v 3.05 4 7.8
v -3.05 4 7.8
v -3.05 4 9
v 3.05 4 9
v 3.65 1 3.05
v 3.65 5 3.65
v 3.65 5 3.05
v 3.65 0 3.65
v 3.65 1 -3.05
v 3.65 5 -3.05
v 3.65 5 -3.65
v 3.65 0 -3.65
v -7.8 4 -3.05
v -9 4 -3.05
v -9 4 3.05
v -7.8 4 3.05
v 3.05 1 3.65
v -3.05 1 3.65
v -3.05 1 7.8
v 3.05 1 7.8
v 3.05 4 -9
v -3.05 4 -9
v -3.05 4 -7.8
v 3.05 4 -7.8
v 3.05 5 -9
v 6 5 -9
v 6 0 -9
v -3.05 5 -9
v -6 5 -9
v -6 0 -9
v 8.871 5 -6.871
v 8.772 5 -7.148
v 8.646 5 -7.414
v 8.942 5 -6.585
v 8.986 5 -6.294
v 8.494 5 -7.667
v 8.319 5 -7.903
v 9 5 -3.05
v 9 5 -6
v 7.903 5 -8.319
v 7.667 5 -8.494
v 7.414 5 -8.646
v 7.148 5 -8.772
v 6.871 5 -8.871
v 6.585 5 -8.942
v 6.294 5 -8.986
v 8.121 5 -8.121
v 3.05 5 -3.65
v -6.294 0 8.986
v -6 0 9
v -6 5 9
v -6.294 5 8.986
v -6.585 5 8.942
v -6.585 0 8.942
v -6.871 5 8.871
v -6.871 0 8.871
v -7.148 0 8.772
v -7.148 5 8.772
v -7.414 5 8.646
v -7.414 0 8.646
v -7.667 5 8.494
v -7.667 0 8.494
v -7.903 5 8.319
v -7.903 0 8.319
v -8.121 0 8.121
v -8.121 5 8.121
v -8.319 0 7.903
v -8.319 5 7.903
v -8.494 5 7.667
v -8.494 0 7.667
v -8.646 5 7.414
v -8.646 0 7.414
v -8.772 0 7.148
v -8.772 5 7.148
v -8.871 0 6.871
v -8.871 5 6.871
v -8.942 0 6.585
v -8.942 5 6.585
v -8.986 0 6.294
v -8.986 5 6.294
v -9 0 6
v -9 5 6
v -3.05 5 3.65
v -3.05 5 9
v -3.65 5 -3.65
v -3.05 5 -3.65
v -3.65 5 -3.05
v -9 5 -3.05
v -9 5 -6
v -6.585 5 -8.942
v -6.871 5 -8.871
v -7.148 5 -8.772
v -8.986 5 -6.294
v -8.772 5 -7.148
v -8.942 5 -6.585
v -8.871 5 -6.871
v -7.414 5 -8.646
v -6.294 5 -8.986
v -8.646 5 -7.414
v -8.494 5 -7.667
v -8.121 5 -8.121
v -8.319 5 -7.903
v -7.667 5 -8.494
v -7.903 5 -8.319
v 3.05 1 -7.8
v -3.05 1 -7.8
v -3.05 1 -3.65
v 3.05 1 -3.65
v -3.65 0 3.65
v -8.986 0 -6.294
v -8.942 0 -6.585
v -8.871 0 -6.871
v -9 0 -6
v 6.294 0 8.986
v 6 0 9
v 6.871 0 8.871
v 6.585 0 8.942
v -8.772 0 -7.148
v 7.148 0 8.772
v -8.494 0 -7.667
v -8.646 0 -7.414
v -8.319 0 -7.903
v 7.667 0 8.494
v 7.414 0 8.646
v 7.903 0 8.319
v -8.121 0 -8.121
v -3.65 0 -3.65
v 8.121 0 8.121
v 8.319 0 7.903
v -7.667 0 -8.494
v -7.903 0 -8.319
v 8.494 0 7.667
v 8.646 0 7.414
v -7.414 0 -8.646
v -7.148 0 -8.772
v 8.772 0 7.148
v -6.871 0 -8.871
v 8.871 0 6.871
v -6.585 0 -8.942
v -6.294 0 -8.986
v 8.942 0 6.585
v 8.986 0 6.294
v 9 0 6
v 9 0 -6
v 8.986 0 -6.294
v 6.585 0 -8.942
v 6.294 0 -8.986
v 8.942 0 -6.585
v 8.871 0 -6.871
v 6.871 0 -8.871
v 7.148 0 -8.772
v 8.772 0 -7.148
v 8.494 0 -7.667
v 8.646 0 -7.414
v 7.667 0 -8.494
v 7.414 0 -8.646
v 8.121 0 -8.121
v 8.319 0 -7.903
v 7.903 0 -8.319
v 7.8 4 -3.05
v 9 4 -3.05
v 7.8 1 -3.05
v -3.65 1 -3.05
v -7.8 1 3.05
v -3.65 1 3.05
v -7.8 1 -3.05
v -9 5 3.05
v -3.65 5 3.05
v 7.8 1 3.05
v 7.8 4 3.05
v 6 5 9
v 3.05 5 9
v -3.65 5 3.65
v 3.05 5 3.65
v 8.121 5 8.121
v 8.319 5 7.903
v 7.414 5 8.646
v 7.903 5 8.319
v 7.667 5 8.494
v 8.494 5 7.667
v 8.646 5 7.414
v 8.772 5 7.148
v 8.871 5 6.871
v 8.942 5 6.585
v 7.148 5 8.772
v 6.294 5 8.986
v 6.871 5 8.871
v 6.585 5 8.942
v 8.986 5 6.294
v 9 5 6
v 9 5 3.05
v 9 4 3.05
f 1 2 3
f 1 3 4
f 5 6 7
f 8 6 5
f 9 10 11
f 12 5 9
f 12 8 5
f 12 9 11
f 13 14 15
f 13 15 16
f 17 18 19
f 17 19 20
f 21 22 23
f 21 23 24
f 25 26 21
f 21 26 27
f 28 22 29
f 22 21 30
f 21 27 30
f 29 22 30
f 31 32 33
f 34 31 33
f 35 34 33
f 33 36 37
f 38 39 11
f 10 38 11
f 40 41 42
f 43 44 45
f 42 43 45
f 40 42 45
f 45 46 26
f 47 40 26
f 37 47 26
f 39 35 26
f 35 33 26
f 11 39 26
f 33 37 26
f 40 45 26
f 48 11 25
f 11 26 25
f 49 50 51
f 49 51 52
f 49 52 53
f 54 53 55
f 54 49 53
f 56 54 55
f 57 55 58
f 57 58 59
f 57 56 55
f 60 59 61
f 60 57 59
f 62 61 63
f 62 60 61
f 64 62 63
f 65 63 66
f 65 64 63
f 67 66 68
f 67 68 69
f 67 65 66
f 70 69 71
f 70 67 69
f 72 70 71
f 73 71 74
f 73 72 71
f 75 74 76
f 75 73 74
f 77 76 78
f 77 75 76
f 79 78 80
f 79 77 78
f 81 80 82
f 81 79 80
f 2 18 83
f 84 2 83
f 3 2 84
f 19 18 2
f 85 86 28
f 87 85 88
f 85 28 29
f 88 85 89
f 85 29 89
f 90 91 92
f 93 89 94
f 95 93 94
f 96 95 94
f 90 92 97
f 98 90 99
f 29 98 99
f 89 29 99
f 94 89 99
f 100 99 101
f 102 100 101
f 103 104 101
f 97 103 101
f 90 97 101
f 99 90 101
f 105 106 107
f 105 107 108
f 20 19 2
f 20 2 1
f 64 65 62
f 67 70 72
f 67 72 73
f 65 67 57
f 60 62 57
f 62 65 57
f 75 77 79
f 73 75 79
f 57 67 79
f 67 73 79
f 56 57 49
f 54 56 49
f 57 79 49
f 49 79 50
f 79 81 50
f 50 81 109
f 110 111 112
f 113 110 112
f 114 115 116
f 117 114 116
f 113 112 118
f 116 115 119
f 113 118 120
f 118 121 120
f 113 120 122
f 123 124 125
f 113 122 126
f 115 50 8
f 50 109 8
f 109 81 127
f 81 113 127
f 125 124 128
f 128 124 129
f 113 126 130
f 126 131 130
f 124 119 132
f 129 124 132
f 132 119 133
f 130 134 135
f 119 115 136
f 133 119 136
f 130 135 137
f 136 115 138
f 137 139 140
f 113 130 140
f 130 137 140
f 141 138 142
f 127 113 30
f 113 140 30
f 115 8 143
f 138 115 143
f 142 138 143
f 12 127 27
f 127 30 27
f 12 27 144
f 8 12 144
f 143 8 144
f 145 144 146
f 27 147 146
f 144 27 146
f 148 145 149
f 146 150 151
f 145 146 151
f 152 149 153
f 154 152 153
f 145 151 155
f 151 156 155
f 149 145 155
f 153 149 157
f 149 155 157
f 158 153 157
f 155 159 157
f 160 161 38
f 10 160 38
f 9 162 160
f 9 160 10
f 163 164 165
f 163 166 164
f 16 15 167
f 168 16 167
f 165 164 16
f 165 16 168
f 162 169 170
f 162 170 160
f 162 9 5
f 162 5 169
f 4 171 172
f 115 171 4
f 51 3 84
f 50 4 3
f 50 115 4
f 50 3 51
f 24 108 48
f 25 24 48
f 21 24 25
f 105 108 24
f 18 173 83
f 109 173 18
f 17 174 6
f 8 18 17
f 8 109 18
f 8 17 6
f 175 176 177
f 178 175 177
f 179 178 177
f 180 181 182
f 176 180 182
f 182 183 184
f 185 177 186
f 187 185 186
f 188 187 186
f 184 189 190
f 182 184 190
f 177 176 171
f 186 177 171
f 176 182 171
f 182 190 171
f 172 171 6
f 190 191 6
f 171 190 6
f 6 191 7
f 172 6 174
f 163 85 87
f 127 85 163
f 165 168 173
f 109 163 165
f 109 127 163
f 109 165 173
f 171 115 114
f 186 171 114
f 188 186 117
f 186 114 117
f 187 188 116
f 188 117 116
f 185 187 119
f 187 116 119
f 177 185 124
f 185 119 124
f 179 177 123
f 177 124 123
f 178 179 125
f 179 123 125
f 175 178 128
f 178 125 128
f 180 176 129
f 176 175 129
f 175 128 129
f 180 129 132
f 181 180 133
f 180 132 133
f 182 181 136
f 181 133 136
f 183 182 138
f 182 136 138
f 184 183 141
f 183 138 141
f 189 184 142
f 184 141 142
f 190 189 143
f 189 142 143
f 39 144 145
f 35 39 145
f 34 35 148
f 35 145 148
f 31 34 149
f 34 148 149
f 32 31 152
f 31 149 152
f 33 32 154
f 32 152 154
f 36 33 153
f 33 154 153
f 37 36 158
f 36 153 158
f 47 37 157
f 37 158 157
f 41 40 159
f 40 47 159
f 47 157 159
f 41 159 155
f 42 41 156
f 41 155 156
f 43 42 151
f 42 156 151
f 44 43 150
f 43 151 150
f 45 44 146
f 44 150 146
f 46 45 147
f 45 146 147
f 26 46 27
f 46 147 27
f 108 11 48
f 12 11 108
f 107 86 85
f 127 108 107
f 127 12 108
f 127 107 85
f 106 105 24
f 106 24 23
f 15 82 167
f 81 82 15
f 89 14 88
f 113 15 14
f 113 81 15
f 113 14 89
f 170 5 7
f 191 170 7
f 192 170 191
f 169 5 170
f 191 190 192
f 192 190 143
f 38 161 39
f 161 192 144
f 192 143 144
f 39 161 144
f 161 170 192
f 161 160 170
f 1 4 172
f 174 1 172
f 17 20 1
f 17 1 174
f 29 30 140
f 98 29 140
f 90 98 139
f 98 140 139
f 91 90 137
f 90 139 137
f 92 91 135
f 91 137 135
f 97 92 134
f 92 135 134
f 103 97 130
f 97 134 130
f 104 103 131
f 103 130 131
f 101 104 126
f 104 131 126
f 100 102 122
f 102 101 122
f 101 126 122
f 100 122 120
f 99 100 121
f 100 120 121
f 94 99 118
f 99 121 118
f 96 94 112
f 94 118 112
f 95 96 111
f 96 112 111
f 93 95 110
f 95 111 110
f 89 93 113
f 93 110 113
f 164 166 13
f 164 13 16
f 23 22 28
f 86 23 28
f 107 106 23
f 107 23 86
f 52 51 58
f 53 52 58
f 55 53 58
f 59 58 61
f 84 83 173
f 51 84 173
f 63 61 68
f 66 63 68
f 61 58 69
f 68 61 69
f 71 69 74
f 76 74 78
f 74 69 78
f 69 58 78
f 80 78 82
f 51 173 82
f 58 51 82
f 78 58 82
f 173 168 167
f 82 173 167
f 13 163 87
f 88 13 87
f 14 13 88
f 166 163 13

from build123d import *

# Parameters (mm, degrees)
SKETCH1_W           = 7.3
SKETCH1_H           = 7.3
BOSS_EXTRUDE1_DEPTH = 1
BOSS_EXTRUDE2_DEPTH = 3
BOSS_EXTRUDE3_DEPTH = 1


with BuildPart() as part:
    # Sketch1 → Boss-Extrude1 (new body)
    with BuildSketch(Plane(origin=(0, 0, 0), x_dir=(1, 0, 0), z_dir=(0, 1, 0))):
        with BuildLine():
            Line((-6, -9), (6, -9))
            ThreePointArc((6, -9), (8.121320344, -8.121320344), (9, -6))
            Line((9, -6), (9, 6))
            ThreePointArc((9, 6), (8.121320344, 8.121320344), (6, 9))
            Line((6, 9), (-6, 9))
            ThreePointArc((-6, 9), (-8.121320344, 8.121320344), (-9, 6))
            Line((-9, 6), (-9, -6))
            ThreePointArc((-9, -6), (-8.121320344, -8.121320344), (-6, -9))
        make_face()
        Rectangle(SKETCH1_W, SKETCH1_H, mode=Mode.SUBTRACT)
    extrude(amount=BOSS_EXTRUDE1_DEPTH)

    # Sketch2 → Boss-Extrude2 (add)
    with BuildSketch(Plane(origin=(0, 1, 0), x_dir=(1, 0, 0), z_dir=(0, 1, 0))):
        with BuildLine():
            Line((-6, -9), (6, -9))
            ThreePointArc((6, -9), (8.121320344, -8.121320344), (9, -6))
            Line((9, -6), (9, 6))
            ThreePointArc((9, 6), (8.121320344, 8.121320344), (6, 9))
            Line((6, 9), (-6, 9))
            ThreePointArc((-6, 9), (-8.121320344, 8.121320344), (-9, 6))
            Line((-9, 6), (-9, -6))
            ThreePointArc((-9, -6), (-8.121320344, -8.121320344), (-6, -9))
        make_face()
        Polygon((-3.05, -3.65), (-3.05, -7.8), (3.05, -7.8), (3.05, -3.65), (3.65, -3.65), (3.65, -3.05), (7.8, -3.05), (7.8, 3.05), (3.65, 3.05), (3.65, 3.65), (3.05, 3.65), (3.05, 7.8), (-3.05, 7.8), (-3.05, 3.65), (-3.65, 3.65), (-3.65, 3.05), (-7.8, 3.05), (-7.8, -3.05), (-3.65, -3.05), (-3.65, -3.65), align=None, mode=Mode.SUBTRACT)
    extrude(amount=BOSS_EXTRUDE2_DEPTH)

    # Sketch3 → Boss-Extrude3 (add)
    with BuildSketch(Plane(origin=(0, 4, 0), x_dir=(1, 0, 0), z_dir=(0, 1, 0))):
        with BuildLine():
            Line((-3.65, -3.05), (-3.65, -3.65))
            Line((-3.65, -3.65), (-3.05, -3.65))
            Line((-3.05, -3.65), (-3.05, -9))
            Line((-3.05, -9), (-6, -9))
            ThreePointArc((-6, -9), (-8.121320344, -8.121320344), (-9, -6))
            Line((-9, -6), (-9, -3.05))
            Line((-9, -3.05), (-3.65, -3.05))
        make_face()
        with BuildLine():
            Line((6, -9), (3.05, -9))
            Line((3.05, -9), (3.05, -3.65))
            Line((3.05, -3.65), (3.65, -3.65))
            Line((3.65, -3.65), (3.65, -3.05))
            Line((3.65, -3.05), (9, -3.05))
            Line((9, -3.05), (9, -6))
            ThreePointArc((9, -6), (8.121320344, -8.121320344), (6, -9))
        make_face()
        with BuildLine():
            Line((3.65, 3.05), (3.65, 3.65))
            Line((3.65, 3.65), (3.05, 3.65))
            Line((3.05, 3.65), (3.05, 9))
            Line((3.05, 9), (6, 9))
            ThreePointArc((6, 9), (8.121320344, 8.121320344), (9, 6))
            Line((9, 6), (9, 3.05))
            Line((9, 3.05), (3.65, 3.05))
        make_face()
        with BuildLine():
            Line((-6, 9), (-3.05, 9))
            Line((-3.05, 9), (-3.05, 3.65))
            Line((-3.05, 3.65), (-3.65, 3.65))
            Line((-3.65, 3.65), (-3.65, 3.05))
            Line((-3.65, 3.05), (-9, 3.05))
            Line((-9, 3.05), (-9, 6))
            ThreePointArc((-9, 6), (-8.121320344, 8.121320344), (-6, 9))
        make_face()
    extrude(amount=BOSS_EXTRUDE3_DEPTH)


solid = part.part
